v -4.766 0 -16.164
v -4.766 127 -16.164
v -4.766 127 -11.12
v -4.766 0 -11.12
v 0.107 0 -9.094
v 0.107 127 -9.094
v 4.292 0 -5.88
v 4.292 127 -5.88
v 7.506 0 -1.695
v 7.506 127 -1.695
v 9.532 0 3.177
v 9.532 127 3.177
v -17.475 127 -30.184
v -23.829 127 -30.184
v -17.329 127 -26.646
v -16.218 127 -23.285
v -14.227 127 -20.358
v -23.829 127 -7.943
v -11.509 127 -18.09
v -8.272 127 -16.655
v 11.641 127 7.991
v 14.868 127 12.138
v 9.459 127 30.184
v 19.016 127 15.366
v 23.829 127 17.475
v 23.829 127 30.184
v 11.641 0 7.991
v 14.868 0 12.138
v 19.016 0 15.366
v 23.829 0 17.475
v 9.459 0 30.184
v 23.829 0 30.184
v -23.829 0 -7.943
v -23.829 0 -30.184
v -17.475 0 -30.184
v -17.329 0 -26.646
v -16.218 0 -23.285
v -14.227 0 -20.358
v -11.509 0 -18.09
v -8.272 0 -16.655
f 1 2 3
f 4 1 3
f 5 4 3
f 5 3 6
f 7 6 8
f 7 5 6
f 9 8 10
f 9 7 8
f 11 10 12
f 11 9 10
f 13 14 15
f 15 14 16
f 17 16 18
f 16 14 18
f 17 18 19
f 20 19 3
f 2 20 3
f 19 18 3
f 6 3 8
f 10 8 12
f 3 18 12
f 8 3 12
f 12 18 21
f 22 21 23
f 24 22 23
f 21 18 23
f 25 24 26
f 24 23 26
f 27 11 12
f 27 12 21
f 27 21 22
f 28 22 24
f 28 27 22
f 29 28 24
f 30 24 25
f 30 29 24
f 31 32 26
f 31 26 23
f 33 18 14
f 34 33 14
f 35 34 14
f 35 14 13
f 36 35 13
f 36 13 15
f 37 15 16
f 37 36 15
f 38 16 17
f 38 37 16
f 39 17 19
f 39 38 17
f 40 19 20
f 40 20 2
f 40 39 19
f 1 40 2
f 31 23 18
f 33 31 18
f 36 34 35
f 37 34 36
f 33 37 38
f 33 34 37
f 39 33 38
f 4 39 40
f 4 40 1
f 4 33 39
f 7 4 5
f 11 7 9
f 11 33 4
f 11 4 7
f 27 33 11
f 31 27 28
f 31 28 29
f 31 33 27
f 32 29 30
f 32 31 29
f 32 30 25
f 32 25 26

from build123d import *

# Parameters (mm, degrees)
F1_DEPTH = 127


# Not quite as in the source:
# - ends of sketch curves that miss each other by under 0.0002 mm in the source are joined


with BuildPart() as f1:
    # F0 (on Front) → F1 (new body)
    with BuildSketch(Plane.XZ):
        with BuildLine():
            Line((23.829137, 17.474692), (23.829137, 30.1835566))
            Line((23.829137, 30.1835566), (9.4594934, 30.1835566))
            Line((9.4594934, 30.1835566), (-23.8291116, -7.9430372))
            Line((-23.8291116, -7.9430372), (-23.8291116, -30.1835312))
            Line((-23.8291116, -30.1835312), (-17.474692, -30.1835312))
            ThreePointArc((-17.474692, -30.1835312), (-14.2269141432, -20.357689713), (-4.7658274, -16.1644838))
            Line((-4.7658274, -16.1644838), (-4.7658274, -11.120247))
            ThreePointArc((-4.7658274, -11.120247), (4.2916437043, -5.8802359043), (9.5316594554, 3.1772339438))
            ThreePointArc((9.5316594554, 3.1772339438), (14.8680934033, 12.1382706133), (23.829137, 17.474692))
        make_face()
    extrude(amount=-F1_DEPTH)


solid = f1.part
